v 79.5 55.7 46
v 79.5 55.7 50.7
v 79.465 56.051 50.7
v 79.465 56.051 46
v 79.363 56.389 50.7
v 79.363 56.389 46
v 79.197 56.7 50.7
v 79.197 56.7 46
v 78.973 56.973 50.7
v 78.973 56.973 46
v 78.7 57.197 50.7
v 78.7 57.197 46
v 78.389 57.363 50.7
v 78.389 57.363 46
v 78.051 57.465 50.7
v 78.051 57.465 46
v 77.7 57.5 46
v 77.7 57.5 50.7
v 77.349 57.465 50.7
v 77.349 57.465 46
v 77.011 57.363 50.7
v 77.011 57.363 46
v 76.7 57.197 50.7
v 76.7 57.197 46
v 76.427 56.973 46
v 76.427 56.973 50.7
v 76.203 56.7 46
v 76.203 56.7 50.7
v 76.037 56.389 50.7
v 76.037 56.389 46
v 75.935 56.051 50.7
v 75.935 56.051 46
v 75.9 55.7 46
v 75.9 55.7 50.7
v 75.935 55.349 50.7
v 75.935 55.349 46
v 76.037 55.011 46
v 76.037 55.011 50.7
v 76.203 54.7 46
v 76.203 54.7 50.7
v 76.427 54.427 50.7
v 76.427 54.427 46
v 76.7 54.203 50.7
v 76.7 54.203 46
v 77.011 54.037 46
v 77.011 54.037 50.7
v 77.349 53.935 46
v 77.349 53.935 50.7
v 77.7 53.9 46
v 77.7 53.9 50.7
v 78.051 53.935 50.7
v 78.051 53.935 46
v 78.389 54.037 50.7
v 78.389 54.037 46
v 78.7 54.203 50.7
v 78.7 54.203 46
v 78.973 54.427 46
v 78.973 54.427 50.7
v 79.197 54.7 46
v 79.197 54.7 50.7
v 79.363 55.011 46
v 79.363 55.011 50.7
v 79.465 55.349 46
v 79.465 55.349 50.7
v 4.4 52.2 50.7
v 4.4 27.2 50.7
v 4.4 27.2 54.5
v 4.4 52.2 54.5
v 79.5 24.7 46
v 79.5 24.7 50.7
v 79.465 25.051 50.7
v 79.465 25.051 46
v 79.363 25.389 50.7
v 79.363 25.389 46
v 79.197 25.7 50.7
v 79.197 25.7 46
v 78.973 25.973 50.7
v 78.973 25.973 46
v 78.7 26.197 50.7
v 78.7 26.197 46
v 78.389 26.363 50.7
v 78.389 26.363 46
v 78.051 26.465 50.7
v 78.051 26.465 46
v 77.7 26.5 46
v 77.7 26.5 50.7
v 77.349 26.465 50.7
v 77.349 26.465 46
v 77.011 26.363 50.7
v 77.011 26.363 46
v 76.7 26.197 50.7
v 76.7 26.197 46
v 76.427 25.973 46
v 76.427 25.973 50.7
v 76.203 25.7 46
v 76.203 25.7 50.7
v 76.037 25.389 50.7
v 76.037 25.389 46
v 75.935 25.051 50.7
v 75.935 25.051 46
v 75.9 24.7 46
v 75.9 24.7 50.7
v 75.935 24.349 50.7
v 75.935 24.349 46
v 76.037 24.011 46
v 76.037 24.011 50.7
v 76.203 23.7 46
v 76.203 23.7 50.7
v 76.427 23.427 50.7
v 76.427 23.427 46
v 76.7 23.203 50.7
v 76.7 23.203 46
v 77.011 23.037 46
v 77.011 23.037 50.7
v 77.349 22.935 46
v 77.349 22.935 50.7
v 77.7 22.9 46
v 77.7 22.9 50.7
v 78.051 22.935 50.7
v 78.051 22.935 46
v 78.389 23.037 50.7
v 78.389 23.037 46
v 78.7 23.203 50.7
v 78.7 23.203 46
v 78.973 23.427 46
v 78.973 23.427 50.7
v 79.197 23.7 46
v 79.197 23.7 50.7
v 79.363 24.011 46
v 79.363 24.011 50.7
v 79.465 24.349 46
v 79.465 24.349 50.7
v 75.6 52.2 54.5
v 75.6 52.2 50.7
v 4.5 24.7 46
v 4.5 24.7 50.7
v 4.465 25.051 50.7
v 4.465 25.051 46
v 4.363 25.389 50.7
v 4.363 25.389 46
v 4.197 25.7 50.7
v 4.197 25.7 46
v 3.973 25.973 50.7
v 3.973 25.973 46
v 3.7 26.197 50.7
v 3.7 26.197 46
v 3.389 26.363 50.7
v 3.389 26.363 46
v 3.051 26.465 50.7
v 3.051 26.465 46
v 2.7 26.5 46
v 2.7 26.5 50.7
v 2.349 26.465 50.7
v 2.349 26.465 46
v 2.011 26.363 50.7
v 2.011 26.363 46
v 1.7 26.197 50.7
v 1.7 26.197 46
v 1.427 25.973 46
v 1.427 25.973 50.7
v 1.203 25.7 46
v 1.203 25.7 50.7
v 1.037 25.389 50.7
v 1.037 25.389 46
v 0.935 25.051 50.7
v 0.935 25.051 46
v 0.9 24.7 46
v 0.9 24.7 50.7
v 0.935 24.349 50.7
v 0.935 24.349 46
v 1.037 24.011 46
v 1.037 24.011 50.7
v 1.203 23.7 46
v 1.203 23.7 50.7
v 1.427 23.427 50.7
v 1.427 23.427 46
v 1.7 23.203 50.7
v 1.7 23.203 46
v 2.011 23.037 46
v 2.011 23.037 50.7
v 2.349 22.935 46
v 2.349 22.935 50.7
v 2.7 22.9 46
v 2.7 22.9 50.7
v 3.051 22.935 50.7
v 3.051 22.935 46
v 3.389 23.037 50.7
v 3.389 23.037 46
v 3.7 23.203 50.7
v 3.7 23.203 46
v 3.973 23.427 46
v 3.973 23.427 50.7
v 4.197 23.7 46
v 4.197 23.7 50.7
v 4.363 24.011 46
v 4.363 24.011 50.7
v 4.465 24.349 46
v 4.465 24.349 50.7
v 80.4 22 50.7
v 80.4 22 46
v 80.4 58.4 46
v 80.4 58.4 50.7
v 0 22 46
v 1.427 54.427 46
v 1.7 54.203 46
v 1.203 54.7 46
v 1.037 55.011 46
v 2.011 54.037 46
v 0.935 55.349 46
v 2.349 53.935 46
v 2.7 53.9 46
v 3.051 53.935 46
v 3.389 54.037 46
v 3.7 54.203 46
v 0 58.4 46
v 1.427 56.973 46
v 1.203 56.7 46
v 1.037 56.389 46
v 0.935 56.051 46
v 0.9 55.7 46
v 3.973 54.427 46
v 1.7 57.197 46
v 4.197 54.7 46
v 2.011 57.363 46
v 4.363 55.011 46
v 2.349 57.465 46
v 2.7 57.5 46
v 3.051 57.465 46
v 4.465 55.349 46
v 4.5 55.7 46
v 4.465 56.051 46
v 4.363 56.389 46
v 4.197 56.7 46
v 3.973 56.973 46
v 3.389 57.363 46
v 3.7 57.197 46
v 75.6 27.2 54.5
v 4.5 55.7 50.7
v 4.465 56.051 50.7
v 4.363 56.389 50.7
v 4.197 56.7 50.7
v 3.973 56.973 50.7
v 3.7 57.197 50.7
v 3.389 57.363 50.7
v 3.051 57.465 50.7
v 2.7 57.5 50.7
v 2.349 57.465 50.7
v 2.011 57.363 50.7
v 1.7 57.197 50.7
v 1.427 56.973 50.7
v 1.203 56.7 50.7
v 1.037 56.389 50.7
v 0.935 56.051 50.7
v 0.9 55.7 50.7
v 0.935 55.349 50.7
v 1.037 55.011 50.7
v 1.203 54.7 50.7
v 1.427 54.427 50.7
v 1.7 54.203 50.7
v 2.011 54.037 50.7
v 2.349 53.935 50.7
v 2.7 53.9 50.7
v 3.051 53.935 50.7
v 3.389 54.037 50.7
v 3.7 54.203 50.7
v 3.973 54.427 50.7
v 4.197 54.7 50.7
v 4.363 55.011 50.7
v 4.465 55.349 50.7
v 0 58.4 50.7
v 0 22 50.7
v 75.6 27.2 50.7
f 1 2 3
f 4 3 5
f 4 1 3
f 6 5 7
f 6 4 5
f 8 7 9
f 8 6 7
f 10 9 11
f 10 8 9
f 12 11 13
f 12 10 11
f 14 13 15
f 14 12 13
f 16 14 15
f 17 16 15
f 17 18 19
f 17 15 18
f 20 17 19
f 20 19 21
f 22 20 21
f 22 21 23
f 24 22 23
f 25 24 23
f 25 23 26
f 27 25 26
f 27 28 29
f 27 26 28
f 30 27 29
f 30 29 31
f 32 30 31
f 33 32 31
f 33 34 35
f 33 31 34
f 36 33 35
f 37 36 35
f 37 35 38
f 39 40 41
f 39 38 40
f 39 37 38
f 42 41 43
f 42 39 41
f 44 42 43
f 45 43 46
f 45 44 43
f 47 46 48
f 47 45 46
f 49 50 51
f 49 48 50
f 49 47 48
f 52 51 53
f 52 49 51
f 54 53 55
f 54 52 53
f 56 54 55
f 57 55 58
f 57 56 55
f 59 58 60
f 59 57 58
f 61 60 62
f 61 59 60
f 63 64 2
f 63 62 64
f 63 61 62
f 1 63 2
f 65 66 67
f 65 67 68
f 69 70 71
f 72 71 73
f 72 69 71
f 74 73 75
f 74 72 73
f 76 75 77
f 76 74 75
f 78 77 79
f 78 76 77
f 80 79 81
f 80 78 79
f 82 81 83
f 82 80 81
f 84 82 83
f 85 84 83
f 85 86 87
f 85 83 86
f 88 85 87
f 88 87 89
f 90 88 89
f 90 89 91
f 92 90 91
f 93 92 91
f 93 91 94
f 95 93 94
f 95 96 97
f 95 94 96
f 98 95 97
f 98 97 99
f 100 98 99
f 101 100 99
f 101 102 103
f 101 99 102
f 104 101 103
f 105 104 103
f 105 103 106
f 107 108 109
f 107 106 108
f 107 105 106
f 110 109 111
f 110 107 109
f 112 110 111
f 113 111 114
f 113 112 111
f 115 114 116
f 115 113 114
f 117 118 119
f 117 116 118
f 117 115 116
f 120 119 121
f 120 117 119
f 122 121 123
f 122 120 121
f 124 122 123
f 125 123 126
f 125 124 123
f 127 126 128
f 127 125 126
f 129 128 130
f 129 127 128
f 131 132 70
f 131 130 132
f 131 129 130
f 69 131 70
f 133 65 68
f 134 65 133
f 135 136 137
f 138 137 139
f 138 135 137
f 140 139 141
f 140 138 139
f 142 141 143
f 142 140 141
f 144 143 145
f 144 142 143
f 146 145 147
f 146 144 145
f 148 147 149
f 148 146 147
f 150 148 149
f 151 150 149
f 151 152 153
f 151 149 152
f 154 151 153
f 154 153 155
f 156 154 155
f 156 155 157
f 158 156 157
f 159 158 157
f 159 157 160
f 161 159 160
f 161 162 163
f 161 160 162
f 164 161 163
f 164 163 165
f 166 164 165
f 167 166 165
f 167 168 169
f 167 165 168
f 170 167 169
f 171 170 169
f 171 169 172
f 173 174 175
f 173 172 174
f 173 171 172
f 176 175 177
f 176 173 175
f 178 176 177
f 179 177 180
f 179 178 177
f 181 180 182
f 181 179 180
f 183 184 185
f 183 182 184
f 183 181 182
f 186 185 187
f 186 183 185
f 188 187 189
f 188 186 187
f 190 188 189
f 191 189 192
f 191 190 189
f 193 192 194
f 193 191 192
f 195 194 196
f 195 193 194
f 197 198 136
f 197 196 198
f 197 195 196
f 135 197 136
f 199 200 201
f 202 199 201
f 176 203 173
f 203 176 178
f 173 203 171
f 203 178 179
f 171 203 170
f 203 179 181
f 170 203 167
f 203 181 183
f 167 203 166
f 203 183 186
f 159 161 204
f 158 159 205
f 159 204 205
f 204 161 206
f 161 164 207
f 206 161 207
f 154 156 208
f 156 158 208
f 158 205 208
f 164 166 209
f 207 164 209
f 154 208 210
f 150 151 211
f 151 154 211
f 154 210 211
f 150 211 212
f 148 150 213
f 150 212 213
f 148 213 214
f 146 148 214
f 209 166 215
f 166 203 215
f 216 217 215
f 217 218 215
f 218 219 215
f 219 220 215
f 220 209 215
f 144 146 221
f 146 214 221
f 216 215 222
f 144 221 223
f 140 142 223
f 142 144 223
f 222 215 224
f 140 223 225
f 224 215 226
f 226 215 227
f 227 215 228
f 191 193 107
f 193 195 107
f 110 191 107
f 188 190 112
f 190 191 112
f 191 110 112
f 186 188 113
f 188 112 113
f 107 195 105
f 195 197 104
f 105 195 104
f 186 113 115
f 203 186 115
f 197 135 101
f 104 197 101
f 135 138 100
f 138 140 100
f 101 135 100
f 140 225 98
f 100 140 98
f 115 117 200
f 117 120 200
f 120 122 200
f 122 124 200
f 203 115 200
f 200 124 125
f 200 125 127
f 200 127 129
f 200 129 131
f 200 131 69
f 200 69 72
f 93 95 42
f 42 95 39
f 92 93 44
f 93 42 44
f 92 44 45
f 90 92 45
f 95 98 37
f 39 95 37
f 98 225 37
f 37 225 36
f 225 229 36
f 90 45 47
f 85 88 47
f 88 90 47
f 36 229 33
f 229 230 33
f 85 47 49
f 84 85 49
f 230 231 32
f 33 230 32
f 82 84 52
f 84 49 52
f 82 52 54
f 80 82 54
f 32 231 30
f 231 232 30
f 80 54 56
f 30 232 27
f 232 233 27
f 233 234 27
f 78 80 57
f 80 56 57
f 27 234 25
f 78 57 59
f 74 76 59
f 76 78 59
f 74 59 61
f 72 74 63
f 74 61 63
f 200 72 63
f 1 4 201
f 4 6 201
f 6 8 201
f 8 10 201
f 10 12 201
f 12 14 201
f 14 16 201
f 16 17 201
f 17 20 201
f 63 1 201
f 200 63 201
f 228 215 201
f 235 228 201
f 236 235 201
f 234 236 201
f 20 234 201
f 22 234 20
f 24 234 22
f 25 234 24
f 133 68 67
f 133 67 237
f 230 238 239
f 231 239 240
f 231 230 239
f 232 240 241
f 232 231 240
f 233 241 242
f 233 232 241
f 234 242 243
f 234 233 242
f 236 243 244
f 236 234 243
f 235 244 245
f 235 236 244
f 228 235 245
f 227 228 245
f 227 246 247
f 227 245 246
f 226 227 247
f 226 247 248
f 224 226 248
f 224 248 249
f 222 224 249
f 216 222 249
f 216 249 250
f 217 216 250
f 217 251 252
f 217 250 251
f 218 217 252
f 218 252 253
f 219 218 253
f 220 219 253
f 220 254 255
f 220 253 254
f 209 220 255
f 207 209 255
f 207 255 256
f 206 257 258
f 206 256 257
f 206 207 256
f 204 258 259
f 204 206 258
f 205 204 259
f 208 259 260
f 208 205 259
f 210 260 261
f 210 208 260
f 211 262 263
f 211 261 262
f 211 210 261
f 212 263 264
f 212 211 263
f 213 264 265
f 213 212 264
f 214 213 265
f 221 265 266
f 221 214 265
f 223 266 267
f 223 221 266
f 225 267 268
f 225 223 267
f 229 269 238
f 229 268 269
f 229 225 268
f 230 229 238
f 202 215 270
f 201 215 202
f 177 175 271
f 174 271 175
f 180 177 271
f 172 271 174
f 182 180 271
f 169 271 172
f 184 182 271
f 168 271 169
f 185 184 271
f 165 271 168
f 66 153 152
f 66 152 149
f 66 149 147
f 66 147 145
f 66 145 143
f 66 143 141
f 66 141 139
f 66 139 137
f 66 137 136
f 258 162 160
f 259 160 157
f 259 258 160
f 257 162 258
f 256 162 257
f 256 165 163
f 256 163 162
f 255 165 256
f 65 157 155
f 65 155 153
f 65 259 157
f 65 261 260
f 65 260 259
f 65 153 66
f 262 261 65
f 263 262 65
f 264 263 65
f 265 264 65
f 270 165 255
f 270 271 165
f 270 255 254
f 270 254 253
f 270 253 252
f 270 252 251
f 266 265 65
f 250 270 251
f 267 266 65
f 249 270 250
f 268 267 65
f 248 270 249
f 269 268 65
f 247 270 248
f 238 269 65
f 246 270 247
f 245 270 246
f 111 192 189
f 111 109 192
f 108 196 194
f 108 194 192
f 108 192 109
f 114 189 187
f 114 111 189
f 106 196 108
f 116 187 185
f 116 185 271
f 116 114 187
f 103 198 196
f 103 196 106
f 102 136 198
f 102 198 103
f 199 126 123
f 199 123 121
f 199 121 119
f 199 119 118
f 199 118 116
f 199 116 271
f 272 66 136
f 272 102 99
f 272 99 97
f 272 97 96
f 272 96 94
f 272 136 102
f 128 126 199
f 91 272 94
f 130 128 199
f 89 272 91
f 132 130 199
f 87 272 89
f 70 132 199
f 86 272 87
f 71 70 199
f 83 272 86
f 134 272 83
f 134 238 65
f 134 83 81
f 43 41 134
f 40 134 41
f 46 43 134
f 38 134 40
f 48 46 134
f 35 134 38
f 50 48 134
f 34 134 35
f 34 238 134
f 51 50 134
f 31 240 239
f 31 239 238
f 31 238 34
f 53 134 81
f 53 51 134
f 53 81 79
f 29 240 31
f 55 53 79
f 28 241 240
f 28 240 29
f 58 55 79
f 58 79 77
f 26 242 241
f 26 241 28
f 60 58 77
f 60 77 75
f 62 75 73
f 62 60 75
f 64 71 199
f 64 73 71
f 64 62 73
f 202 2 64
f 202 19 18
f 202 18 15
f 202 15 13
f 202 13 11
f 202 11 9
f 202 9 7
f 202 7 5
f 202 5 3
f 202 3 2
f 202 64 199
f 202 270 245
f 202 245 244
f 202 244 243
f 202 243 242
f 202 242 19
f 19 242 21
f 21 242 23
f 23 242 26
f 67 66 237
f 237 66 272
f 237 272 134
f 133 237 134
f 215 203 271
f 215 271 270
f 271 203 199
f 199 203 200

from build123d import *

# Parameters (mm, degrees)
CYLINDER002_R     = 1.8
CYLINDER002_DEPTH = 10
ARRAY003_X_COUNT  = 2
ARRAY003_X_PITCH  = 75
ARRAY003_Y_COUNT  = 2
ARRAY003_Y_PITCH  = 31
BOX008_W          = 80.4
BOX008_H          = 36.4
BOX008_DEPTH      = 4.7
BOX_W             = 71.2
BOX_H             = 25
BOX_DEPTH         = 3.8


with BuildPart() as hole_clone:
    # Cylinder002 → Cylinder002 (new body)
    with BuildSketch(Plane(origin=(3.7, 3.7, 0), x_dir=(1, 0, 0), z_dir=(0, 0, 1))):
        Circle(CYLINDER002_R)
    extrude(amount=CYLINDER002_DEPTH)

    # Array003 X: hole clone ×2


with BuildPart() as hole_clone_1:
    add(hole_clone.part)
    with Locations(*[(i * ARRAY003_X_PITCH, 0, 0) for i in range(1, ARRAY003_X_COUNT)]):
        add(hole_clone.part)

    # Array003 Y: hole clone ×2


with BuildPart() as hole_clone_2:
    add(hole_clone_1.part)
    with Locations(*[(0, i * ARRAY003_Y_PITCH, 0) for i in range(1, ARRAY003_Y_COUNT)]):
        add(hole_clone_1.part)


with BuildPart() as hole_clone_3:
    # Body placement: moved
    add(hole_clone_2.part.moved(Location((-1, -1, 0))))


with BuildPart() as under_display:
    # Box008 → Box008 (new body)
    with BuildSketch(Plane.XY):
        with Locations((40.2, 18.2)):
            Rectangle(BOX008_W, BOX008_H)
    extrude(amount=BOX008_DEPTH)


with BuildPart() as f_16x2_lcd_mockup_clone:
    # Box → Box (new body)
    with BuildSketch(Plane(origin=(4.4, 5.2, 4.7), x_dir=(1, 0, 0), z_dir=(0, 0, 1))):
        with Locations((35.6, 12.5)):
            Rectangle(BOX_W, BOX_H)
    extrude(amount=BOX_DEPTH)

    # Fusion004: union under display
    add(under_display.part)

    # Cut: cut hole clone
    add(hole_clone_3.part, mode=Mode.SUBTRACT)


with BuildPart() as f_16x2_lcd_mockup_clone_1:
    # Body002 placement: moved
    add(f_16x2_lcd_mockup_clone.part.moved(Location((0, 22, 46))))


solid = f_16x2_lcd_mockup_clone_1.part
